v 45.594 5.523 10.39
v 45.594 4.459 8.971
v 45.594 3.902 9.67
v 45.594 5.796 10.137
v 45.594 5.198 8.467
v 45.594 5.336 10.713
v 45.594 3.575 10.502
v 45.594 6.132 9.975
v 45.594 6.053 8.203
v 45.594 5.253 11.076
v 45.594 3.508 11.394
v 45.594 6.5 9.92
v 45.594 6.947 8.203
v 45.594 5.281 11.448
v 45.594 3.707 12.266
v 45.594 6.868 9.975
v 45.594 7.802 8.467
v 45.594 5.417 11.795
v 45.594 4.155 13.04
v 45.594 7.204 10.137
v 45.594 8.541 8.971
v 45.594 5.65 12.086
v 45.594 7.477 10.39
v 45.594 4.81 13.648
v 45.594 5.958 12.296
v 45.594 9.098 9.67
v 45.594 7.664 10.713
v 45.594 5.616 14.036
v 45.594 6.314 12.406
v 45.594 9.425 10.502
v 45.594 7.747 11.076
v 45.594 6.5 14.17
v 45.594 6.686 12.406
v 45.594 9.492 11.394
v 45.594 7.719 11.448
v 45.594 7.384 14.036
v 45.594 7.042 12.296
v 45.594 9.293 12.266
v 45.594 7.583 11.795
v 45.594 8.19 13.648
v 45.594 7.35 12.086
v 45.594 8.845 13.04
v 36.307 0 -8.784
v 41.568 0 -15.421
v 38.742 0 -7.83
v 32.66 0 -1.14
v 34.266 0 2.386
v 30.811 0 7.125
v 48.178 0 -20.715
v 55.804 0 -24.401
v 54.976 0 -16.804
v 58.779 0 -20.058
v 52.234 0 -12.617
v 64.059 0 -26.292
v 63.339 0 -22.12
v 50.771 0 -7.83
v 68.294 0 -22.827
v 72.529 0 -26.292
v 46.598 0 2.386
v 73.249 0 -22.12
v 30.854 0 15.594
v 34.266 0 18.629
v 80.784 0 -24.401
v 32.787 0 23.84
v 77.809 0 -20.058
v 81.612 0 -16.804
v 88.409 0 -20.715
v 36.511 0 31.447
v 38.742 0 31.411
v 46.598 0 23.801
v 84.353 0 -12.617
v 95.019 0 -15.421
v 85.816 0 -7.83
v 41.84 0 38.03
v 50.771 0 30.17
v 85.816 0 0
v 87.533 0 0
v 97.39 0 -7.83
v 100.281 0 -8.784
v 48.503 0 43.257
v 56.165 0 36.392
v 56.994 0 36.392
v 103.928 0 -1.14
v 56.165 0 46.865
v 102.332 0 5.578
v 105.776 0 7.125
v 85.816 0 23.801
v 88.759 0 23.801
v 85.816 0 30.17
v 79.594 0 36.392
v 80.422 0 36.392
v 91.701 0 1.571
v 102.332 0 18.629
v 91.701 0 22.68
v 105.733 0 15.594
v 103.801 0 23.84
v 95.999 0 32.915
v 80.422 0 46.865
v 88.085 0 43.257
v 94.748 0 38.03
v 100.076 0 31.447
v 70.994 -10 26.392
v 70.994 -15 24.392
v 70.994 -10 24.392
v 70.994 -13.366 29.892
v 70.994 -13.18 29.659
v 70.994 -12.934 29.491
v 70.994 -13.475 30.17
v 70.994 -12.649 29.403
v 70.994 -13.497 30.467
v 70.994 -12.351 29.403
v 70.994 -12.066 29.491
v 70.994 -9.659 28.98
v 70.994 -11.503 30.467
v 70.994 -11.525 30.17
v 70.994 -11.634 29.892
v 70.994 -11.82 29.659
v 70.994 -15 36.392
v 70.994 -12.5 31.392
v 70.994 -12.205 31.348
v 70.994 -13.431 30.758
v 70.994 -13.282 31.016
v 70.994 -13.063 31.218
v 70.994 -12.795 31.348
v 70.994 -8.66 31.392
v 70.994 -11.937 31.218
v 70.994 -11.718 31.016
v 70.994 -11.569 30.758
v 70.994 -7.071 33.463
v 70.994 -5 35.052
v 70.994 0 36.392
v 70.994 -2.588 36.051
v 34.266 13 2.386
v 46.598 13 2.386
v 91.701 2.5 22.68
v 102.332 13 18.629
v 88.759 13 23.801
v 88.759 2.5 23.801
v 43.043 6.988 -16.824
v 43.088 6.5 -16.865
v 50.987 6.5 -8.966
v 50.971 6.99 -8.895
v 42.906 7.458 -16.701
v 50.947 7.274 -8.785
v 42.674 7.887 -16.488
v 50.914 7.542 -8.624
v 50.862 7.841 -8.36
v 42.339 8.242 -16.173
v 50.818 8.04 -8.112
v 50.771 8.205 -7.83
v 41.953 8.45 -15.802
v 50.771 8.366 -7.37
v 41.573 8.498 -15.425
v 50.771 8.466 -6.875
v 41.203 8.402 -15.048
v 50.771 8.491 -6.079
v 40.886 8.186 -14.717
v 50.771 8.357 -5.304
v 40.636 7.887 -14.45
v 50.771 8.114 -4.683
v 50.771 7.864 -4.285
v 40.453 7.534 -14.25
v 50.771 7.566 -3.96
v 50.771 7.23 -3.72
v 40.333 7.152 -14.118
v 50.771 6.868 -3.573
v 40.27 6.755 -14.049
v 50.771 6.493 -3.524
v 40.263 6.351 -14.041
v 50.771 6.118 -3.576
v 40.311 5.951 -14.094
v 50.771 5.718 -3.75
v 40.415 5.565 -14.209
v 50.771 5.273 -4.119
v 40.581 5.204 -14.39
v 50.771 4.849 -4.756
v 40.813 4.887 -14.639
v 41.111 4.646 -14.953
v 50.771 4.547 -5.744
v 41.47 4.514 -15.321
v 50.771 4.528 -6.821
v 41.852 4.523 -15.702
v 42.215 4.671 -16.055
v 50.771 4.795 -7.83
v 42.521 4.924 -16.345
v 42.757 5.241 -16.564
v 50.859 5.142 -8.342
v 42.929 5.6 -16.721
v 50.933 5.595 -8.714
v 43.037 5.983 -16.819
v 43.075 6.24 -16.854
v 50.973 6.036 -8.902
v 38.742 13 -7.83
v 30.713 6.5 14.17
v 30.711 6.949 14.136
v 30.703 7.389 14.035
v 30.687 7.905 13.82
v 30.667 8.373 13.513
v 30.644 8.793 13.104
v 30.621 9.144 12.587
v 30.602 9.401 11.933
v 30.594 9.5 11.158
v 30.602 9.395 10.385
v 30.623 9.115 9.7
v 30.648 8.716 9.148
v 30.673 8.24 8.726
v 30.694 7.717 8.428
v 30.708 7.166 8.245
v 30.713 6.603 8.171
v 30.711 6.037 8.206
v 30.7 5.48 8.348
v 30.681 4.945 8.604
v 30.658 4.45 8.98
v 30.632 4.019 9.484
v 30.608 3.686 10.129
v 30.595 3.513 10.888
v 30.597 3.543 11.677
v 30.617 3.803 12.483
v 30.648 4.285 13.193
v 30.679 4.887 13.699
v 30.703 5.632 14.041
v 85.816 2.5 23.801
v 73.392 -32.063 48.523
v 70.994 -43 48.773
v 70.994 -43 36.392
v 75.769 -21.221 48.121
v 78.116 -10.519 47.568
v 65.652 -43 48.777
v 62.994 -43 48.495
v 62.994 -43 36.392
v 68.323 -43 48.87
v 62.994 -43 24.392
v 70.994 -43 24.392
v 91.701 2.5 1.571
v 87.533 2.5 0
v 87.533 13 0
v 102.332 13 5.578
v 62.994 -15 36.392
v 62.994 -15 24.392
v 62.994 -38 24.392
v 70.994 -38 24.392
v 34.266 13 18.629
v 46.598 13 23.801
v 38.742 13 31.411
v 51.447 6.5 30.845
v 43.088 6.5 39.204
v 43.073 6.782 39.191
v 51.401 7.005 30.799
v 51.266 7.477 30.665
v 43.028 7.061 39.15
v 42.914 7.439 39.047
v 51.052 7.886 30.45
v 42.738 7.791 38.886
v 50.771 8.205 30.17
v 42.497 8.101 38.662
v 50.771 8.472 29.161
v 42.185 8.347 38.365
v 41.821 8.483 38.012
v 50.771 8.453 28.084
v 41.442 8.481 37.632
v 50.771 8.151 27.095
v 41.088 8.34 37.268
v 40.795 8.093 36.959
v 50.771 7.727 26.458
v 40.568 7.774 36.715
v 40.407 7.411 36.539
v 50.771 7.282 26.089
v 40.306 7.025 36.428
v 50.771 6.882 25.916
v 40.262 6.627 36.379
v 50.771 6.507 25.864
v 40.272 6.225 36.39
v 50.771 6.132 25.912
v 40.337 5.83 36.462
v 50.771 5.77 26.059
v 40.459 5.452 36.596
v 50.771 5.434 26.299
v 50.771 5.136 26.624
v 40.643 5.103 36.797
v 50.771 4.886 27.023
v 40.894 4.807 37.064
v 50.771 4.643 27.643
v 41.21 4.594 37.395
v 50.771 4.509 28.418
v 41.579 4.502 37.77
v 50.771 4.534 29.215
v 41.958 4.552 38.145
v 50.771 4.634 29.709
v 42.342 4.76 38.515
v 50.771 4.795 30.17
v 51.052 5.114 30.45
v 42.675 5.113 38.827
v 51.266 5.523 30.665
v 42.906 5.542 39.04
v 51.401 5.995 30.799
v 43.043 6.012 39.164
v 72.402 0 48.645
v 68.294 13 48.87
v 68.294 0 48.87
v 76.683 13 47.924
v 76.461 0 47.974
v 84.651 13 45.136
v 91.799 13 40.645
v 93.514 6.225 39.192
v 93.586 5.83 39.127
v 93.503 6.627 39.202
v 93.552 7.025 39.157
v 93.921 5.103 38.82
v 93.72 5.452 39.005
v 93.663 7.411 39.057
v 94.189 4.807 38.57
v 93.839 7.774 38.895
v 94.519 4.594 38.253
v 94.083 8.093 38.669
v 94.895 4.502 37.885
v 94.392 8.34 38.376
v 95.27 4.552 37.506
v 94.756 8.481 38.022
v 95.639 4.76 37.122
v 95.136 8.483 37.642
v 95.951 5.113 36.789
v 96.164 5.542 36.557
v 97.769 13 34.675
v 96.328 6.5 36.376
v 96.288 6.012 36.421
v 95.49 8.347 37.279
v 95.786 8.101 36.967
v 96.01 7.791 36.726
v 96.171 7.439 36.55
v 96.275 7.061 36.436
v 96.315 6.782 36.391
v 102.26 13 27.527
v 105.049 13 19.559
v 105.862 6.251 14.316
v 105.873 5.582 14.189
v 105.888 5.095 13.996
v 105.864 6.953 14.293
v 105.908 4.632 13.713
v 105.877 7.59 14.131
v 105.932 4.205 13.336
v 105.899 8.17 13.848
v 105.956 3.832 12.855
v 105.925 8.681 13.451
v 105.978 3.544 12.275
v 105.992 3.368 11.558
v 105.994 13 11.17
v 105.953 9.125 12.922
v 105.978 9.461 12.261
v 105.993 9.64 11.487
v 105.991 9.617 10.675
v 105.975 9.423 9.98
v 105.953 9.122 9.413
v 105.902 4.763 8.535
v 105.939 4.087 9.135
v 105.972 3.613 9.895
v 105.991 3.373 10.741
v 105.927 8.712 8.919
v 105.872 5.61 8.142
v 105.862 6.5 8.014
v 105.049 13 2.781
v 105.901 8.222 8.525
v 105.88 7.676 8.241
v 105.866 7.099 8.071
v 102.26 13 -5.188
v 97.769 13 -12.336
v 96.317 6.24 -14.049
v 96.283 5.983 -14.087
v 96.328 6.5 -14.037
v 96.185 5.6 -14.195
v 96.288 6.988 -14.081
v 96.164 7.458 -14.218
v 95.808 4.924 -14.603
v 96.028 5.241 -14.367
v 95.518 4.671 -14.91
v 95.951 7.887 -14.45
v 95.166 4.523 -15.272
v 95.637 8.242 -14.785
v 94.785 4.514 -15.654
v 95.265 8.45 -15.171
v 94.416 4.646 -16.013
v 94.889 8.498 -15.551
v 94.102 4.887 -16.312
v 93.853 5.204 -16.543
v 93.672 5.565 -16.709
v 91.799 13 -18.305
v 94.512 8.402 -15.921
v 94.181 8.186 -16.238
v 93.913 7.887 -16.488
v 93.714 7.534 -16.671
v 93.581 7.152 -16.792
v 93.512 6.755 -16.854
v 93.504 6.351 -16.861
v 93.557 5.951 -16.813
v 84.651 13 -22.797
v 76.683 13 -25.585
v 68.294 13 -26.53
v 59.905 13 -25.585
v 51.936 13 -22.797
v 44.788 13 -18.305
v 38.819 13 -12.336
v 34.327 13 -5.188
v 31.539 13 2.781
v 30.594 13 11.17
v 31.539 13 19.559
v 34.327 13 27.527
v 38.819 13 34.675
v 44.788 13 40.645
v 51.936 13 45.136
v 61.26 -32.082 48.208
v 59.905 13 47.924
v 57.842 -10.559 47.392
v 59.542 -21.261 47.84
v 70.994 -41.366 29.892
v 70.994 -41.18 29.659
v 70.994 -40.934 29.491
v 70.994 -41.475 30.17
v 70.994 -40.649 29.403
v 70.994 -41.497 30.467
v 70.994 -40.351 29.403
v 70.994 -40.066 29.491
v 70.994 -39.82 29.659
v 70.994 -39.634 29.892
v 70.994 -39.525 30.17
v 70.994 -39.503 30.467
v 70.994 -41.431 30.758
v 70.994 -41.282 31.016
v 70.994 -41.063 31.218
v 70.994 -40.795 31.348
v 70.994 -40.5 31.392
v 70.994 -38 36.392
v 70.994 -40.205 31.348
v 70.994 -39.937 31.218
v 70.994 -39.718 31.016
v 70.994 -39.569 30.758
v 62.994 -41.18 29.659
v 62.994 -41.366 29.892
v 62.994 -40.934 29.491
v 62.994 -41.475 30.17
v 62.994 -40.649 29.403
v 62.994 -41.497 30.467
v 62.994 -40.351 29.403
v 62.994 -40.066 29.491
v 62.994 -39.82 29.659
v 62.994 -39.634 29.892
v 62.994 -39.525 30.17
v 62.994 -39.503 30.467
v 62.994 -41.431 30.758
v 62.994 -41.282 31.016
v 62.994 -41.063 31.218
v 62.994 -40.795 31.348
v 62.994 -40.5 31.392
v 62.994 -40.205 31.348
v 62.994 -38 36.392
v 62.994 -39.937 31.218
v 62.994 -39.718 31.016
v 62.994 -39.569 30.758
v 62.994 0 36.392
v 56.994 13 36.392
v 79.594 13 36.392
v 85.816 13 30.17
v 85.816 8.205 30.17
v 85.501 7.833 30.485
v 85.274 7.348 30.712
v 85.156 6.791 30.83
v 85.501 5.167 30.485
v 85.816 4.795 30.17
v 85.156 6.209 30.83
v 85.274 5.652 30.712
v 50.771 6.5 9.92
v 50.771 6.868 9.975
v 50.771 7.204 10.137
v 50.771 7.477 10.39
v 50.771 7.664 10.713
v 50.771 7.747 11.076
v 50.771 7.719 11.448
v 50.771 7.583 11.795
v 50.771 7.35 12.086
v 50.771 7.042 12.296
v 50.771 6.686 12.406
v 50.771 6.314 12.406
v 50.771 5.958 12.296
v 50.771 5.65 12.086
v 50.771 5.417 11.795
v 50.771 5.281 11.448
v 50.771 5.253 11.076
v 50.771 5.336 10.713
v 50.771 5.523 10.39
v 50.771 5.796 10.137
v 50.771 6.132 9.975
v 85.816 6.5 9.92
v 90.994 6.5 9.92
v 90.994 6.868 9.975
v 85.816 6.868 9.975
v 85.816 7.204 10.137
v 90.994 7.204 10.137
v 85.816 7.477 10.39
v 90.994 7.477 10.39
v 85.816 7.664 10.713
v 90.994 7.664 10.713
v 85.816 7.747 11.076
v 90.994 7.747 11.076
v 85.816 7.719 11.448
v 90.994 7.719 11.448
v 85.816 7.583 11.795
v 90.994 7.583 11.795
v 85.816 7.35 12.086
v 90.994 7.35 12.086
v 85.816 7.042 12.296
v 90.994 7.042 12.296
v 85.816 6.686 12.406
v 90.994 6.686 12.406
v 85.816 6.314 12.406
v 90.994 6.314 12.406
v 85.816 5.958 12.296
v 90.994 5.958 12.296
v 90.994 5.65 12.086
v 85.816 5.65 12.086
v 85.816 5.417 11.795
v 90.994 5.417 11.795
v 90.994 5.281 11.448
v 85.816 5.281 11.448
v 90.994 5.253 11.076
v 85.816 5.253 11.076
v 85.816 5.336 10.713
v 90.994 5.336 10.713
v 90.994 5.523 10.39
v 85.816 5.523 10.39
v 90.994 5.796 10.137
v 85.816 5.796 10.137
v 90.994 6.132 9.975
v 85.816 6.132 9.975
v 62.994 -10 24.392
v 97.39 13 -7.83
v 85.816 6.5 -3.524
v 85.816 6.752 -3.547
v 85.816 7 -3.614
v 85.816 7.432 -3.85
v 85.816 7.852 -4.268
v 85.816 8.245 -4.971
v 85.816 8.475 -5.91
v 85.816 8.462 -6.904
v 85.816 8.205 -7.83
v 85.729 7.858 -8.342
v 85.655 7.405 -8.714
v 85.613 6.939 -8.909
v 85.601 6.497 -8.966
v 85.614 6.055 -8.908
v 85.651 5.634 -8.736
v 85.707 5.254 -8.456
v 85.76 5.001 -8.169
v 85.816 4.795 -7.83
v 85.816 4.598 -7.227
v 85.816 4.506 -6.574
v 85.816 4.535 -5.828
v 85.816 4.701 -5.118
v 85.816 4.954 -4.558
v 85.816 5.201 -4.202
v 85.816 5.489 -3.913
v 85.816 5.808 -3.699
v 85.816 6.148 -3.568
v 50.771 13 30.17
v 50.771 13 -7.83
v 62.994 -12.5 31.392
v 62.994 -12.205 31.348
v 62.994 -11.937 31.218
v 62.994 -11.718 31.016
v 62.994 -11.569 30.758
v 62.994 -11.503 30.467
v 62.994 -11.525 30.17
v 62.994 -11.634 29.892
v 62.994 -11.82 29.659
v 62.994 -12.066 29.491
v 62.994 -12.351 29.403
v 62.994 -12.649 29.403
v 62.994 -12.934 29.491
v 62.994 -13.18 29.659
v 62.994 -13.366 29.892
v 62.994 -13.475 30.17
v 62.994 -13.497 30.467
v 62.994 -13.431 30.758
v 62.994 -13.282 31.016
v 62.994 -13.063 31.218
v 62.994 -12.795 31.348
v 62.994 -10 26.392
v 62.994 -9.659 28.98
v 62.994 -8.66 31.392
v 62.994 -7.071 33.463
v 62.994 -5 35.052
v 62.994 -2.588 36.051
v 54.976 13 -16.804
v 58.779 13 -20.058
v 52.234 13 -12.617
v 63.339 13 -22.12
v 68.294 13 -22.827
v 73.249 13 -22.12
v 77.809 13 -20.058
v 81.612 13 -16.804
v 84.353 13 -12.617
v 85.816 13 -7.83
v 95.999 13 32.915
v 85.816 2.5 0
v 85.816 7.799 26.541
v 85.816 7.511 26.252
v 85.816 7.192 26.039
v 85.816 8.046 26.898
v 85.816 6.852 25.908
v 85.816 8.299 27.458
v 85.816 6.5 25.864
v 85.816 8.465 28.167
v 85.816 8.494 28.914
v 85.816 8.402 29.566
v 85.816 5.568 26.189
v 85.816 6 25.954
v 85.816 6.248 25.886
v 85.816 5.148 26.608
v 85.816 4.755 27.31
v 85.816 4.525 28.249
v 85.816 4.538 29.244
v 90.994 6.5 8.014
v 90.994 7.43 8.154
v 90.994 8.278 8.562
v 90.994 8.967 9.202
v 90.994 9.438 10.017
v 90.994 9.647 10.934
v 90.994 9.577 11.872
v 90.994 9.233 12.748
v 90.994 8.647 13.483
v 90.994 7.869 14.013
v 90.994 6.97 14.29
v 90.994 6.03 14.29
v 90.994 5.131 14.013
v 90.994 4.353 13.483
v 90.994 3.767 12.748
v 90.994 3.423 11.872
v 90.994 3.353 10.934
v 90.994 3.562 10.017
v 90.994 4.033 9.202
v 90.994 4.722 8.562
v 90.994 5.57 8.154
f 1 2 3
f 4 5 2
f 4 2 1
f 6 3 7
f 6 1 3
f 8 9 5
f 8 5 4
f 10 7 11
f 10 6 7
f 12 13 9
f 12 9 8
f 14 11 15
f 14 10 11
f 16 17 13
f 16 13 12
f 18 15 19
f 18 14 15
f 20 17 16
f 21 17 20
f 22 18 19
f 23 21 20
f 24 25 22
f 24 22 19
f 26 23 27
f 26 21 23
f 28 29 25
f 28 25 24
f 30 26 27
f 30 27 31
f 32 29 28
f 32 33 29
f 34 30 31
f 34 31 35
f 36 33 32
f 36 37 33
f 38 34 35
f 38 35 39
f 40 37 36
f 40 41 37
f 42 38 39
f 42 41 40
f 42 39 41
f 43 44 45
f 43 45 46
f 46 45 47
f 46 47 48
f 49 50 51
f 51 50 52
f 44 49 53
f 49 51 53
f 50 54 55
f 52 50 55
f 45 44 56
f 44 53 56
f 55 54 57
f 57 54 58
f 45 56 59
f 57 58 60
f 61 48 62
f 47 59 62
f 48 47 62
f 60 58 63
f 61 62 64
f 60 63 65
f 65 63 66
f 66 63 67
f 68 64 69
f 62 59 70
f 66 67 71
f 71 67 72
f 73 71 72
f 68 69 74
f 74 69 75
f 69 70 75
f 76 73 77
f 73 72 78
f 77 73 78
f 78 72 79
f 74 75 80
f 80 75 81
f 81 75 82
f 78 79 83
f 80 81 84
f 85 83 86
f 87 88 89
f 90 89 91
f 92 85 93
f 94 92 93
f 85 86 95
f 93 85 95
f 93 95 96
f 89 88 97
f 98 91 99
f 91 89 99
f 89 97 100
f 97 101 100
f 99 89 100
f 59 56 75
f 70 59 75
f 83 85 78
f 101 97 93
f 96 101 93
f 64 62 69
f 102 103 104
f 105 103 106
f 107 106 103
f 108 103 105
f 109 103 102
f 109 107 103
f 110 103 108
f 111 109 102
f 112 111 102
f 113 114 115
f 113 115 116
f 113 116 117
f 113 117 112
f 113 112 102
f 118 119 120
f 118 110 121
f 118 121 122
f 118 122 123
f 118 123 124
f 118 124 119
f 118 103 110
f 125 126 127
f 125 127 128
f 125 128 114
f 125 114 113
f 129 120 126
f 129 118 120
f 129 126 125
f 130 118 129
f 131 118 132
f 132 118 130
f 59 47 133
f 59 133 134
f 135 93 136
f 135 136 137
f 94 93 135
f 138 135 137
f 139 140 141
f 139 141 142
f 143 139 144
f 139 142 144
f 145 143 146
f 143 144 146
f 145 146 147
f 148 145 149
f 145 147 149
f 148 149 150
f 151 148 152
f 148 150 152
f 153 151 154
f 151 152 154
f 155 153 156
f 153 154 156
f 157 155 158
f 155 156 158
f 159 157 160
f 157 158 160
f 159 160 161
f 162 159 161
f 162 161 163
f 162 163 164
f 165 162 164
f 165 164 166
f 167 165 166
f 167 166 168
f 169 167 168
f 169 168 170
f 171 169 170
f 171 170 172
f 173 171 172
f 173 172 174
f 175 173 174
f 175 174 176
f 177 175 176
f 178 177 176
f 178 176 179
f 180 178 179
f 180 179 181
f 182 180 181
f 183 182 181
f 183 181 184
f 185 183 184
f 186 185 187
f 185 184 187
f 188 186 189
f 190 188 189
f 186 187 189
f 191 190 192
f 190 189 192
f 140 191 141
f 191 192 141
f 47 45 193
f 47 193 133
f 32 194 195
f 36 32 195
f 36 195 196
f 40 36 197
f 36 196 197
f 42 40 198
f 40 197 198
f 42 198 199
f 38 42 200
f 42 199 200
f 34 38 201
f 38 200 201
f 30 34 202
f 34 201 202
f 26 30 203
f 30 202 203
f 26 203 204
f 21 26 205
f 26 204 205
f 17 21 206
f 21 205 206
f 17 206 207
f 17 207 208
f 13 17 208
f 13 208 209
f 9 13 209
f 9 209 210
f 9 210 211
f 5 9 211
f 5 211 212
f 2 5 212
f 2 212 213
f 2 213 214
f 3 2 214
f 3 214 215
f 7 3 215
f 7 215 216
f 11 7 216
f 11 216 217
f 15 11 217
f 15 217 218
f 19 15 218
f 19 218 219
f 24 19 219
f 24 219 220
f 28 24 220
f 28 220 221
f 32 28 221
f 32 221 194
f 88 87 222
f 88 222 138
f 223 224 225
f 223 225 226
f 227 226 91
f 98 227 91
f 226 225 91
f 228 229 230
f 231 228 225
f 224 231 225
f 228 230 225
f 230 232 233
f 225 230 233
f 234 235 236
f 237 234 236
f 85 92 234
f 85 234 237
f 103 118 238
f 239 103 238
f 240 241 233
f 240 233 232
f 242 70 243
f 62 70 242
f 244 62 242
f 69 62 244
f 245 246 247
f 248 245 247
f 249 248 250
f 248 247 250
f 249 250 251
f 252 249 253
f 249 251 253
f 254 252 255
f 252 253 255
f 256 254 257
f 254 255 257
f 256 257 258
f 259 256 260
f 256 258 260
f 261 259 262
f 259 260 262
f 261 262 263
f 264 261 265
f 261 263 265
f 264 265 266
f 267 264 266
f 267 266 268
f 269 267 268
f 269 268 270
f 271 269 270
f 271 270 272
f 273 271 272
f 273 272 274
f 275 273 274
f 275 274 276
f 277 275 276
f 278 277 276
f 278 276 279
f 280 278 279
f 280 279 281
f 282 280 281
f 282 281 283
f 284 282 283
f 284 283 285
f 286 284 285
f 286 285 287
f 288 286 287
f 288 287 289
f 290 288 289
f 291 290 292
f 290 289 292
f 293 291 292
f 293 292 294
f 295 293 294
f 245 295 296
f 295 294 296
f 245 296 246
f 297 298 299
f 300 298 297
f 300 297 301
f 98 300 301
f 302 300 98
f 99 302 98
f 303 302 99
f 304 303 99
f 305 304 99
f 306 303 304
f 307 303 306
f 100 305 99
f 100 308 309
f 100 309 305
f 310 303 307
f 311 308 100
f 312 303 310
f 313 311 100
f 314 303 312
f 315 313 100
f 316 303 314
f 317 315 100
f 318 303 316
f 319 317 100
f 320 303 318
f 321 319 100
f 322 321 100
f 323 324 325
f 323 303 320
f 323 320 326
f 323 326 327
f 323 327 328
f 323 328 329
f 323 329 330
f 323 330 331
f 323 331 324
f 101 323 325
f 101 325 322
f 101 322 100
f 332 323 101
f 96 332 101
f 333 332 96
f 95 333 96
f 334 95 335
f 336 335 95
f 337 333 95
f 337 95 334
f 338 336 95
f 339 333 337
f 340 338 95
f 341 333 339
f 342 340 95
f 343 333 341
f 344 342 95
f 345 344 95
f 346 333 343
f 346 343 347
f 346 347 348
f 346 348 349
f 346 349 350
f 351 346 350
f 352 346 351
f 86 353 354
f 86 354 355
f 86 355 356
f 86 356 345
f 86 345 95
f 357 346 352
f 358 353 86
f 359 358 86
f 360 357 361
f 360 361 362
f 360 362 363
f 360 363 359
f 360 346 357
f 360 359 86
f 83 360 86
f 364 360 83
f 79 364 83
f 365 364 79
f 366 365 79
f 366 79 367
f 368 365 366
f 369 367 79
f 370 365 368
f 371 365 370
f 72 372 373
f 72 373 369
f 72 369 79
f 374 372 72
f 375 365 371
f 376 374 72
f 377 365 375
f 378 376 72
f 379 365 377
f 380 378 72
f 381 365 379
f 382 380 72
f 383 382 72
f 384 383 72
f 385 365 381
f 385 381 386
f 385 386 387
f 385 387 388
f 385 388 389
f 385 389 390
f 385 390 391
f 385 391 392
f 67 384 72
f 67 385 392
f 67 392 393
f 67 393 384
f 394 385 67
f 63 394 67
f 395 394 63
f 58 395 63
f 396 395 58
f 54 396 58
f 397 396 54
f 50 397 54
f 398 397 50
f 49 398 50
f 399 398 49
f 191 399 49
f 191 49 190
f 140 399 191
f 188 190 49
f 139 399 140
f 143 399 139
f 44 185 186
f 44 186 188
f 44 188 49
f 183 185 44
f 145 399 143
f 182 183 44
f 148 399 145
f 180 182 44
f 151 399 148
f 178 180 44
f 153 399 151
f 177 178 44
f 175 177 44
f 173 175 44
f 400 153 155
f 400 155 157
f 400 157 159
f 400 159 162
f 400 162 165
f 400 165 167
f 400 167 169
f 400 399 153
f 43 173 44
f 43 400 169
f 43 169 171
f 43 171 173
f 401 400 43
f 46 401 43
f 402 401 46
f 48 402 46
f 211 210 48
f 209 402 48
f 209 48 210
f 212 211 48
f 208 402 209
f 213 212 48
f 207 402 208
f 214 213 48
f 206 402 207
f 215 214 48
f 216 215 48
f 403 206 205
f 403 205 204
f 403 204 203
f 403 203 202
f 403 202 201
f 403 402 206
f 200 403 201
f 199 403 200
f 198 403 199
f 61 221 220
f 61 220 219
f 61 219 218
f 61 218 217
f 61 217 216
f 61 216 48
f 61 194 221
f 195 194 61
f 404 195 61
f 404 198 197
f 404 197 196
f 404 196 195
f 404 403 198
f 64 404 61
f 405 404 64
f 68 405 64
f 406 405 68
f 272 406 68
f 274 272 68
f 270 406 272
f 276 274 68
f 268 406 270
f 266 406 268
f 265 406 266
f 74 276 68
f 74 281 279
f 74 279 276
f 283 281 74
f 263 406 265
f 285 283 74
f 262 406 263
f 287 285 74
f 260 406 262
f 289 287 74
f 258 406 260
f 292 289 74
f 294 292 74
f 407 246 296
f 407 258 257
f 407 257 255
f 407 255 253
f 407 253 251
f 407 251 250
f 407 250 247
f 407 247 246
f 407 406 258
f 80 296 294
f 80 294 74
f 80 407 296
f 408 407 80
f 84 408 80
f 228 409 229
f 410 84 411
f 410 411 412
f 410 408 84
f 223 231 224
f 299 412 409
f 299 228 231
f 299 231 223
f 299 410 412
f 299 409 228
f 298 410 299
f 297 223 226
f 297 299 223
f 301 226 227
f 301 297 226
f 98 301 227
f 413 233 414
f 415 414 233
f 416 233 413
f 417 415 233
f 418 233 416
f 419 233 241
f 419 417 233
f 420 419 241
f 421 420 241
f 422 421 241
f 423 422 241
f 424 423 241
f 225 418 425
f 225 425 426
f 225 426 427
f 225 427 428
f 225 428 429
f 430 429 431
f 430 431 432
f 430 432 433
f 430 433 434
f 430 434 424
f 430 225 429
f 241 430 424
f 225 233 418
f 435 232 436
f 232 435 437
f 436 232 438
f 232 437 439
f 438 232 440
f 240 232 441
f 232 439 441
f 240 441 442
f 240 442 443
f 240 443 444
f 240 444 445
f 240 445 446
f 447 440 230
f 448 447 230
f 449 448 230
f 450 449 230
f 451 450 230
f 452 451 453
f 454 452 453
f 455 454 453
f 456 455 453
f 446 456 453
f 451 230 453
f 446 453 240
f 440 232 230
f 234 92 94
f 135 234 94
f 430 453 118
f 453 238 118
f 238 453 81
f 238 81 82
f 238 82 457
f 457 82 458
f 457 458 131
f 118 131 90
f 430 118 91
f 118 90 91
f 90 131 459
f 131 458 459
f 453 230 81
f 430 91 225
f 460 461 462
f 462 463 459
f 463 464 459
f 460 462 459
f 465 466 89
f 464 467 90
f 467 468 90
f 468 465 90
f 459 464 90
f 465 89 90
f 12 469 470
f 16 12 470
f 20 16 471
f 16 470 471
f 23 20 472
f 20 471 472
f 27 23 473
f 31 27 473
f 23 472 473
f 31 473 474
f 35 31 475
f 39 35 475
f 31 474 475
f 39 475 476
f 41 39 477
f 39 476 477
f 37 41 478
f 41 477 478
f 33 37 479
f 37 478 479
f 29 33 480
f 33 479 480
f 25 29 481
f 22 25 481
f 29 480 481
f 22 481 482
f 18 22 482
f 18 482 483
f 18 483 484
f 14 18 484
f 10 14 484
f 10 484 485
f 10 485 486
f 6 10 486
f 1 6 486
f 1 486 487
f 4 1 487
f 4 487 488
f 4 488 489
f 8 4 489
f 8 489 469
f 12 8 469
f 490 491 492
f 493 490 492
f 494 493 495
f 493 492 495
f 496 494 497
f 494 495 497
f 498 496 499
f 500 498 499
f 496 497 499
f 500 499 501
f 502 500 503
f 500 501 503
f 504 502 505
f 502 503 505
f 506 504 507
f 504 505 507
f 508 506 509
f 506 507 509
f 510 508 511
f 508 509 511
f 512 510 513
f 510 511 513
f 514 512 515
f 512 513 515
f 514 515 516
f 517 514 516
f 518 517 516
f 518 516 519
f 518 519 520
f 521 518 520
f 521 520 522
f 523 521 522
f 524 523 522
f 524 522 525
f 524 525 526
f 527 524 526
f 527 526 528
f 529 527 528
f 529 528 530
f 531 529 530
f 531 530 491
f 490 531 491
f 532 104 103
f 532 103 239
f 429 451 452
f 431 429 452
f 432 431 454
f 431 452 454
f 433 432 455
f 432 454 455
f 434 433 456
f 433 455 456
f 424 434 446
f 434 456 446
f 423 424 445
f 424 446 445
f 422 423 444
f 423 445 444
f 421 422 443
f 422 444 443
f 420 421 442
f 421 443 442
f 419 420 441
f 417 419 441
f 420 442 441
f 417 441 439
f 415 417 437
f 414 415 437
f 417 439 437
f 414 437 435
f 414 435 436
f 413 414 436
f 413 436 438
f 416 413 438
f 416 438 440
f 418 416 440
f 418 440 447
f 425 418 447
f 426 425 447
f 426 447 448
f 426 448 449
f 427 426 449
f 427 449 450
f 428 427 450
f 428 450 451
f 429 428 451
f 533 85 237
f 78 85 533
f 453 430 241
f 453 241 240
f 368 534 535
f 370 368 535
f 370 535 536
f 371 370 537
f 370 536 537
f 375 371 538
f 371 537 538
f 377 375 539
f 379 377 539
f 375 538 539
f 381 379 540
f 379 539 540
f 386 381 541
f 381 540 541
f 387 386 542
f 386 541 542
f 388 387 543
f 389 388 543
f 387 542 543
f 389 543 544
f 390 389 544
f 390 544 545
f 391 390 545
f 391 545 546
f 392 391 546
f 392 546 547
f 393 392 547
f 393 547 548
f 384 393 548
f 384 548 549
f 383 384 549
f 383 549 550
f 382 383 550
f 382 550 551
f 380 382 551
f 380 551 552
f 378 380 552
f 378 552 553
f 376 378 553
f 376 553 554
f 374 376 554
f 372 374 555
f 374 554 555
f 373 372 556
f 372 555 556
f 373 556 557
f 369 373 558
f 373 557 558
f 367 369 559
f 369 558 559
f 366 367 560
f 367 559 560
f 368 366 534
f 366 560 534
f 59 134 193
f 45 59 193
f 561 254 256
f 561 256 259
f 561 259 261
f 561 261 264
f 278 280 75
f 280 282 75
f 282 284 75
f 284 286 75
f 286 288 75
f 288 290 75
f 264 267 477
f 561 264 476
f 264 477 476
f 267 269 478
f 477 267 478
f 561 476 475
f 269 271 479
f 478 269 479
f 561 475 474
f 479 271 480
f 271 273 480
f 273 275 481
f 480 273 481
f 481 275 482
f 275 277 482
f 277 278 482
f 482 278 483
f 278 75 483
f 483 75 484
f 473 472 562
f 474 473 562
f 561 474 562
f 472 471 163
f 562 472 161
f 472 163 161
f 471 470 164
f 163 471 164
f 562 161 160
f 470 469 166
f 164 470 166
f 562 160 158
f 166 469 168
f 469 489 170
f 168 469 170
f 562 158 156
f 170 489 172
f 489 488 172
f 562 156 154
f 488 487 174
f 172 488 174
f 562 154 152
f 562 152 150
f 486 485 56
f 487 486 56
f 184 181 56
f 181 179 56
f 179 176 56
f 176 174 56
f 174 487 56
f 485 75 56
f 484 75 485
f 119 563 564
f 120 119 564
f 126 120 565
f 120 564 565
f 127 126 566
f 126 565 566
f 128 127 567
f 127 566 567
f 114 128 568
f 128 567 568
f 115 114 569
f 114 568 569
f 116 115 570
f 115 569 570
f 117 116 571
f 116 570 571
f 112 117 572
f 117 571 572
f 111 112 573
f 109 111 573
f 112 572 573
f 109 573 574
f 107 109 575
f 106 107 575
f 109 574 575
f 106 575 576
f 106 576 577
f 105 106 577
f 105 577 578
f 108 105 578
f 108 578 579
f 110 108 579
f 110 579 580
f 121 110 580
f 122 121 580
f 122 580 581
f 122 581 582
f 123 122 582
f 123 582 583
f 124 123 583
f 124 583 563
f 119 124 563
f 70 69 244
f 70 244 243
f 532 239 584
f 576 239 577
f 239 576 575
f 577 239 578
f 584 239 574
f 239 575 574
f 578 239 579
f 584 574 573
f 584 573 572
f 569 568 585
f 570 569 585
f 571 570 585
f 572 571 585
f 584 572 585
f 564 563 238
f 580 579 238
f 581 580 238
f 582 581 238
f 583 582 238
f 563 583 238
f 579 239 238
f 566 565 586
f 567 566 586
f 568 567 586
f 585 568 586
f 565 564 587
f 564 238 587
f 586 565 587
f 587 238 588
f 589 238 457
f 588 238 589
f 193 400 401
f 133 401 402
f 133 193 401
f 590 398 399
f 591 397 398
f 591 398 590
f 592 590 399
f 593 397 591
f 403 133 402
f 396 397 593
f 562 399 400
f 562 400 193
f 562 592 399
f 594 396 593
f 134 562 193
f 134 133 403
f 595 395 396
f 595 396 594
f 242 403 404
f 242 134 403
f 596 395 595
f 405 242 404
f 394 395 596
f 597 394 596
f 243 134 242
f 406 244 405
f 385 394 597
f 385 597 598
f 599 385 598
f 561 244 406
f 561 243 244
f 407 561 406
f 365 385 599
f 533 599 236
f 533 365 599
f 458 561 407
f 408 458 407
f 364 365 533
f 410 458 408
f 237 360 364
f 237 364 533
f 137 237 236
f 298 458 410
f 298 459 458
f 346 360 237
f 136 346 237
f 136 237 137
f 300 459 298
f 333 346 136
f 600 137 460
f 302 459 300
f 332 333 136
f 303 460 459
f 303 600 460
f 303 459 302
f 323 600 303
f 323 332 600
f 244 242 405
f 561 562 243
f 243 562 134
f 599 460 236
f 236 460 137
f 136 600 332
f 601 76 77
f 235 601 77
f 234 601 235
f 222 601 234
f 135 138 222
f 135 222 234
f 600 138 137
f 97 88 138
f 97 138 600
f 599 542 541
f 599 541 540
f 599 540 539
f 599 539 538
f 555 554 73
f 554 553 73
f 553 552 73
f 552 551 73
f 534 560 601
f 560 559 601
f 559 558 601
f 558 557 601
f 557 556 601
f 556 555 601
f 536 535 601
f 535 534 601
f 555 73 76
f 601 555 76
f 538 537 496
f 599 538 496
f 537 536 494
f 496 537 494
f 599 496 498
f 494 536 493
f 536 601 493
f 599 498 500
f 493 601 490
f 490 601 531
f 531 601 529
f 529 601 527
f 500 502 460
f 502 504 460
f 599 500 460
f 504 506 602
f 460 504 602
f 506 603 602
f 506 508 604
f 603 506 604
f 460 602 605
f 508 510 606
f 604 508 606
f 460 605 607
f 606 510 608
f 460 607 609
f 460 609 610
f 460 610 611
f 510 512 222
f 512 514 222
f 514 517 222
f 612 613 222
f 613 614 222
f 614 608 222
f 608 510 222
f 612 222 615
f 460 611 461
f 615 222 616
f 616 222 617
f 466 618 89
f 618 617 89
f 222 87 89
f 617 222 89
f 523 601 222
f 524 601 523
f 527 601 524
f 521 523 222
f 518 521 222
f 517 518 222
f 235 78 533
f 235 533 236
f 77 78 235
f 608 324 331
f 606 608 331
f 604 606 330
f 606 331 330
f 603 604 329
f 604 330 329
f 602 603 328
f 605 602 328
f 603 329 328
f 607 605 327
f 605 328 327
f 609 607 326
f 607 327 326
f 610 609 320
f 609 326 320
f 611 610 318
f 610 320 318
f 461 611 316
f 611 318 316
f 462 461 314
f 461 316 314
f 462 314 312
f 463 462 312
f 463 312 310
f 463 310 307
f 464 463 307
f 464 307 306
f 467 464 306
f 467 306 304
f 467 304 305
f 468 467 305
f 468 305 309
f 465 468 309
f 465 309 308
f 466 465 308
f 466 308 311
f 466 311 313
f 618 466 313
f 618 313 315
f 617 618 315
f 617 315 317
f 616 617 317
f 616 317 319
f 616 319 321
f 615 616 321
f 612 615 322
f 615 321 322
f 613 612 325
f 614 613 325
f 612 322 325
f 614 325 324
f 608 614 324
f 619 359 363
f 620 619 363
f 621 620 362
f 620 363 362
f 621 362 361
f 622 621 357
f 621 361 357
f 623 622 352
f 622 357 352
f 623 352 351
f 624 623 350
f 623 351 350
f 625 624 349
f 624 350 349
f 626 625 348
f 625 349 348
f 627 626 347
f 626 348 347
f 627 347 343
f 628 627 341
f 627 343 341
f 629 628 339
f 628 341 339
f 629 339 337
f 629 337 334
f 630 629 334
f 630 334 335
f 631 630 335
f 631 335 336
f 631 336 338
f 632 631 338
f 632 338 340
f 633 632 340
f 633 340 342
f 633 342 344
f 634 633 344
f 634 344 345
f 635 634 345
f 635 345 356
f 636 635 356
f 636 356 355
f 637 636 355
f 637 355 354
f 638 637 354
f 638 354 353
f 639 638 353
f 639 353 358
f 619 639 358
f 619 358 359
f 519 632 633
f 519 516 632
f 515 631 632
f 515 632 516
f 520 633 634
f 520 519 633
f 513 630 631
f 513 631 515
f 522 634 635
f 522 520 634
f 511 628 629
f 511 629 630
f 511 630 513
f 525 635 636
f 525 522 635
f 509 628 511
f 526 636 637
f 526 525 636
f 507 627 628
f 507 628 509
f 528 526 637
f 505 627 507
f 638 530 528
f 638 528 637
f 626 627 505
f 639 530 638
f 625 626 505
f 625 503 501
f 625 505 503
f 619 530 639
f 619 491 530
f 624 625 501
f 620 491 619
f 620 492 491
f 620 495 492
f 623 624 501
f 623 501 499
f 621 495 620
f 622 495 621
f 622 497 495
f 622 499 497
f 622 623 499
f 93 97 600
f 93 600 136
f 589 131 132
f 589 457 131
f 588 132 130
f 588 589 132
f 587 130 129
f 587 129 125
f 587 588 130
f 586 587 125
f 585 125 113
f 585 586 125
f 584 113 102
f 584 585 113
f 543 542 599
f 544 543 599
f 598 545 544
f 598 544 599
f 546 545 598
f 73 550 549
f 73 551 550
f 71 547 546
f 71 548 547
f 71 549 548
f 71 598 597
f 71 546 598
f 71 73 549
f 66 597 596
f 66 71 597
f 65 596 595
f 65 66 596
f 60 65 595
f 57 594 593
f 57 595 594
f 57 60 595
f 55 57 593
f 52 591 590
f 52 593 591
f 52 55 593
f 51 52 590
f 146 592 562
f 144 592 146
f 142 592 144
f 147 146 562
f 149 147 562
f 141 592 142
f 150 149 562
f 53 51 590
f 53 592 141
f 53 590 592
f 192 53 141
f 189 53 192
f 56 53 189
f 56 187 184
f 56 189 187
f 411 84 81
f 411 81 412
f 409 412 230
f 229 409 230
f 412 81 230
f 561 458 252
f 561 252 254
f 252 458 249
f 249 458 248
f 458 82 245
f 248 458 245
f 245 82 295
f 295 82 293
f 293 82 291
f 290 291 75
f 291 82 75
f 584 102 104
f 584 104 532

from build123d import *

# Parameters (mm, degrees)
BOSS_EXTRUDE1_DEPTH      = 13
SKETCH4_W                = 8
SKETCH4_H                = 2
BOSS_EXTRUDE2_DEPTH      = 43
SKETCH5_W                = 8
SKETCH5_H                = 5
BOSS_EXTRUDE3_DEPTH      = 12
SKETCH6_R                = 1
CUT_EXTRUDE3_DEPTH       = 13
FILLET1_R                = 10
BOSS_EXTRUDE4_DEPTH      = 2
SKETCH11_R               = 37.7
BOSS_EXTRUDE5_DEPTH      = 13
SKETCH22_R               = 1.25
CUT_EXTRUDE6_DEPTH       = 83
SKETCH22_3_R             = 3.155829002
SKETCH22_3_R_2           = 1.25
CUT_EXTRUDE7_DEPTH       = 15
SKETCH23_R               = 3
CUT_EXTRUDE8_DEPTH       = 15
BOSS_EXTRUDE6_REACH      = 133.524
BOSS_EXTRUDE6_END_RADIUS = 37.7
SKETCH26_R               = 2
CUT_EXTRUDE9_DEPTH       = 88
SKETCH27_R               = 2
CUT_EXTRUDE10_DEPTH      = 120
SKETCH28_W               = 5.884393281
SKETCH28_H               = 23.801066831
CUT_EXTRUDE11_DEPTH      = 2.5
CUT_EXTRUDE12_REACH      = 126.386


with BuildPart() as part:
    # Sketch2 → Boss-Extrude1 (new body)
    with BuildSketch(Plane(origin=(0, 0, 0), x_dir=(1, 0, 0), z_dir=(0, 1, 0))):
        Polygon((56.165444193, 16.052878064), (80.422298442, 16.052878064), (87.816410992, 8.658765514), (87.816410992, -30.998088735), (80.422298442, -38.392201285), (56.165444193, -38.392201285), (48.771331643, -30.998088735), (48.771331643, 8.658765514), align=None)
        Polygon((50.771331643, -30.16966161), (50.771331643, 7.83033839), (56.993871317, 14.052878064), (79.593871317, 14.052878064), (85.816410992, 7.83033839), (85.816410992, -30.16966161), (79.593871317, -36.392201285), (56.993871317, -36.392201285), align=None, mode=Mode.SUBTRACT)
    extrude(amount=BOSS_EXTRUDE1_DEPTH)

    # Sketch4 → Boss-Extrude2 (add)
    with BuildSketch(Plane.XZ):
        with Locations((66.993871317, 37.392201285)):
            Rectangle(SKETCH4_W, SKETCH4_H)
    extrude(amount=BOSS_EXTRUDE2_DEPTH)

    # Sketch5 → Boss-Extrude3 (add)
    with BuildSketch(Plane(origin=(0, 0, 36.392201285), x_dir=(-1, 0, 0), z_dir=(0, 0, -1))):
        with Locations((-66.993871317, -12.5)):
            Rectangle(SKETCH5_W, SKETCH5_H)
        with Locations((-66.993871317, -40.5)):
            Rectangle(SKETCH5_W, SKETCH5_H)
    extrude(amount=BOSS_EXTRUDE3_DEPTH)

    # Sketch6 → Cut-Extrude3 (cut)
    with BuildSketch(Plane.ZY.offset(-62.993871317)):
        with Locations((30.392201285, -12.5)):
            Circle(SKETCH6_R)
        with Locations((30.392201285, -40.5)):
            Circle(SKETCH6_R)
    extrude(amount=-CUT_EXTRUDE3_DEPTH, mode=Mode.SUBTRACT)

    # Fillet1
    fillet1_edges = [part.edges().sort_by_distance(p)[0] for p in [
        (66.993871317, -10, 36.392201285),
    ]]
    fillet(fillet1_edges, radius=FILLET1_R)

    # Sketch10 → Boss-Extrude4 (add)
    with BuildSketch(Plane.XY.offset(38.392201285)):
        Polygon((56.165444193, 0), (62.993871317, -43), (70.993871317, -43), (80.422298442, 0), align=None)
    extrude(amount=-BOSS_EXTRUDE4_DEPTH)

    # Sketch11 → Boss-Extrude5 (add)
    with BuildSketch(Plane(origin=(0, 13, 0), x_dir=(1, 0, 0), z_dir=(0, 1, 0))):
        with Locations(Location((68.293871317, -11.16966161, 0), (0, 0, 270))):
            Circle(SKETCH11_R)
        Polygon((56.165444193, 16.052878064), (48.771331643, 8.658765514), (48.771331643, -30.998088735), (56.165444193, -38.392201285), (80.422298442, -38.392201285), (87.816410992, -30.998088735), (87.816410992, 8.658765514), (80.422298442, 16.052878064), align=None, mode=Mode.SUBTRACT)
    extrude(amount=-BOSS_EXTRUDE5_DEPTH)

    # Sketch22 → Cut-Extrude6 (cut)
    with BuildSketch(Plane(origin=(105.993871317, 0, 0), x_dir=(0, 0, -1), z_dir=(1, 0, 0))):
        with Locations((-11.16966161, 6.5)):
            Circle(SKETCH22_R)
    extrude(amount=-CUT_EXTRUDE6_DEPTH, mode=Mode.SUBTRACT)

    # Sketch22<3> → Cut-Extrude7 (cut)
    with BuildSketch(Plane(origin=(105.993871317, 0, 0), x_dir=(0, 0, -1), z_dir=(1, 0, 0))):
        with Locations((-11.16966161, 6.5)):
            Circle(SKETCH22_3_R)
        with Locations((-11.16966161, 6.5)):
            Circle(SKETCH22_3_R_2, mode=Mode.SUBTRACT)
    extrude(amount=-CUT_EXTRUDE7_DEPTH, mode=Mode.SUBTRACT)

    # Sketch23 → Cut-Extrude8 (cut)
    with BuildSketch(Plane.ZY.offset(-30.593871317)):
        with Locations((11.16966161, 6.5)):
            Circle(SKETCH23_R)
    extrude(amount=-CUT_EXTRUDE8_DEPTH, mode=Mode.SUBTRACT)

    # Boss-Extrude6: up to this cylinder (the profile starts inside it)
    boss_extrude6_end = Plane(origin=(68.293871317, -17.888133, 11.16966161), z_dir=(0, 1, 0)) * Cylinder(BOSS_EXTRUDE6_END_RADIUS, 343.448, mode=Mode.PRIVATE)
    # Sketch25 → Boss-Extrude6 (add, up to the surface)
    with BuildSketch(Plane.XY.offset(38.392201285), mode=Mode.PRIVATE) as boss_extrude6_sk1:
        Polygon((80.422298442, 0), (56.165444193, 0), (62.993871317, -43), (70.993871317, -43), align=None)
    boss_extrude6_tool1 = extrude(boss_extrude6_sk1.sketch, amount=BOSS_EXTRUDE6_REACH, mode=Mode.PRIVATE) & boss_extrude6_end
    add(boss_extrude6_tool1.solids().sort_by_distance((67.753067, -17.888133, 38.392201))[0])

    # Sketch26 → Cut-Extrude9 (cut)
    with BuildSketch(Plane(origin=(1.904179203, 0, -1.904179203), x_dir=(0.7071067811865485, 0, 0.7071067811865467), z_dir=(-0.7071067811865467, 0, 0.7071067811865485))):
        with Locations((56.18920299, 6.5)):
            Circle(SKETCH26_R)
    extrude(amount=-CUT_EXTRUDE9_DEPTH, mode=Mode.SUBTRACT)

    # Sketch27 → Cut-Extrude10 (cut)
    with BuildSketch(Plane(origin=(66.389692115, 0, 66.389692115), x_dir=(0.7071067811865477, 0, -0.7071067811865474), z_dir=(0.7071067811865474, 0, 0.7071067811865477))):
        with Locations((40.392916054, 6.5)):
            Circle(SKETCH27_R)
    extrude(amount=-CUT_EXTRUDE10_DEPTH, mode=Mode.SUBTRACT)

    # Sketch28 → Cut-Extrude11 (cut)
    with BuildSketch(Plane.XZ):
        with Locations((88.758607633, 11.900533415)):
            Rectangle(SKETCH28_W, SKETCH28_H)
    extrude(amount=-CUT_EXTRUDE11_DEPTH, mode=Mode.SUBTRACT)

    # Sketch30 → Cut-Extrude12 (cut, up to next)
    with BuildSketch(Plane.XZ, mode=Mode.PRIVATE) as cut_extrude12_sk1:
        with BuildLine():
            Line((50.771331643, -7.83033839), (85.816410992, -7.83033839))
            ThreePointArc((85.816410992, -7.83033839), (68.293871317, -22.826628819), (50.771331643, -7.83033839))
        make_face()
    cut_extrude12_tool1 = extrude(cut_extrude12_sk1.sketch, amount=-CUT_EXTRUDE12_REACH, mode=Mode.PRIVATE) & part.part
    # Sketch30 → Cut-Extrude12 (cut, up to next)
    with BuildSketch(Plane.XZ, mode=Mode.PRIVATE) as cut_extrude12_sk2:
        Polygon((38.741691169, -7.83033839), (34.266383325, 2.385887147), (46.597716142, 2.385887147), align=None)
    cut_extrude12_tool2 = extrude(cut_extrude12_sk2.sketch, amount=-CUT_EXTRUDE12_REACH, mode=Mode.PRIVATE) & part.part
    # Sketch30 → Cut-Extrude12 (cut, up to next)
    with BuildSketch(Plane.XZ, mode=Mode.PRIVATE) as cut_extrude12_sk3:
        Polygon((97.389775461, -7.83033839), (87.532944471, 0), (102.33223512, 5.578425036), align=None)
    cut_extrude12_tool3 = extrude(cut_extrude12_sk3.sketch, amount=-CUT_EXTRUDE12_REACH, mode=Mode.PRIVATE) & part.part
    # Sketch30 → Cut-Extrude12 (cut, up to next)
    with BuildSketch(Plane.XZ, mode=Mode.PRIVATE) as cut_extrude12_sk4:
        Polygon((102.33223512, 18.629349006), (88.758607633, 23.801066831), (95.998995796, 32.915268399), align=None)
    cut_extrude12_tool4 = extrude(cut_extrude12_sk4.sketch, amount=-CUT_EXTRUDE12_REACH, mode=Mode.PRIVATE) & part.part
    # Sketch30 → Cut-Extrude12 (cut, up to next)
    with BuildSketch(Plane.XZ, mode=Mode.PRIVATE) as cut_extrude12_sk5:
        Polygon((34.266383325, 18.629349006), (38.741691169, 31.410722253), (46.597716142, 23.801066831), align=None)
    cut_extrude12_tool5 = extrude(cut_extrude12_sk5.sketch, amount=-CUT_EXTRUDE12_REACH, mode=Mode.PRIVATE) & part.part
    add(cut_extrude12_tool1.solids().sort_by_distance((68.293871, 0, -14.118791))[0], mode=Mode.SUBTRACT)
    add(cut_extrude12_tool2.solids().sort_by_distance((39.868597, 0, -1.019521))[0], mode=Mode.SUBTRACT)
    add(cut_extrude12_tool3.solids().sort_by_distance((95.751652, 0, -0.750638))[0], mode=Mode.SUBTRACT)
    add(cut_extrude12_tool4.solids().sort_by_distance((95.696613, 0, 25.115228))[0], mode=Mode.SUBTRACT)
    add(cut_extrude12_tool5.solids().sort_by_distance((39.868597, 0, 24.613713))[0], mode=Mode.SUBTRACT)


solid = part.part
